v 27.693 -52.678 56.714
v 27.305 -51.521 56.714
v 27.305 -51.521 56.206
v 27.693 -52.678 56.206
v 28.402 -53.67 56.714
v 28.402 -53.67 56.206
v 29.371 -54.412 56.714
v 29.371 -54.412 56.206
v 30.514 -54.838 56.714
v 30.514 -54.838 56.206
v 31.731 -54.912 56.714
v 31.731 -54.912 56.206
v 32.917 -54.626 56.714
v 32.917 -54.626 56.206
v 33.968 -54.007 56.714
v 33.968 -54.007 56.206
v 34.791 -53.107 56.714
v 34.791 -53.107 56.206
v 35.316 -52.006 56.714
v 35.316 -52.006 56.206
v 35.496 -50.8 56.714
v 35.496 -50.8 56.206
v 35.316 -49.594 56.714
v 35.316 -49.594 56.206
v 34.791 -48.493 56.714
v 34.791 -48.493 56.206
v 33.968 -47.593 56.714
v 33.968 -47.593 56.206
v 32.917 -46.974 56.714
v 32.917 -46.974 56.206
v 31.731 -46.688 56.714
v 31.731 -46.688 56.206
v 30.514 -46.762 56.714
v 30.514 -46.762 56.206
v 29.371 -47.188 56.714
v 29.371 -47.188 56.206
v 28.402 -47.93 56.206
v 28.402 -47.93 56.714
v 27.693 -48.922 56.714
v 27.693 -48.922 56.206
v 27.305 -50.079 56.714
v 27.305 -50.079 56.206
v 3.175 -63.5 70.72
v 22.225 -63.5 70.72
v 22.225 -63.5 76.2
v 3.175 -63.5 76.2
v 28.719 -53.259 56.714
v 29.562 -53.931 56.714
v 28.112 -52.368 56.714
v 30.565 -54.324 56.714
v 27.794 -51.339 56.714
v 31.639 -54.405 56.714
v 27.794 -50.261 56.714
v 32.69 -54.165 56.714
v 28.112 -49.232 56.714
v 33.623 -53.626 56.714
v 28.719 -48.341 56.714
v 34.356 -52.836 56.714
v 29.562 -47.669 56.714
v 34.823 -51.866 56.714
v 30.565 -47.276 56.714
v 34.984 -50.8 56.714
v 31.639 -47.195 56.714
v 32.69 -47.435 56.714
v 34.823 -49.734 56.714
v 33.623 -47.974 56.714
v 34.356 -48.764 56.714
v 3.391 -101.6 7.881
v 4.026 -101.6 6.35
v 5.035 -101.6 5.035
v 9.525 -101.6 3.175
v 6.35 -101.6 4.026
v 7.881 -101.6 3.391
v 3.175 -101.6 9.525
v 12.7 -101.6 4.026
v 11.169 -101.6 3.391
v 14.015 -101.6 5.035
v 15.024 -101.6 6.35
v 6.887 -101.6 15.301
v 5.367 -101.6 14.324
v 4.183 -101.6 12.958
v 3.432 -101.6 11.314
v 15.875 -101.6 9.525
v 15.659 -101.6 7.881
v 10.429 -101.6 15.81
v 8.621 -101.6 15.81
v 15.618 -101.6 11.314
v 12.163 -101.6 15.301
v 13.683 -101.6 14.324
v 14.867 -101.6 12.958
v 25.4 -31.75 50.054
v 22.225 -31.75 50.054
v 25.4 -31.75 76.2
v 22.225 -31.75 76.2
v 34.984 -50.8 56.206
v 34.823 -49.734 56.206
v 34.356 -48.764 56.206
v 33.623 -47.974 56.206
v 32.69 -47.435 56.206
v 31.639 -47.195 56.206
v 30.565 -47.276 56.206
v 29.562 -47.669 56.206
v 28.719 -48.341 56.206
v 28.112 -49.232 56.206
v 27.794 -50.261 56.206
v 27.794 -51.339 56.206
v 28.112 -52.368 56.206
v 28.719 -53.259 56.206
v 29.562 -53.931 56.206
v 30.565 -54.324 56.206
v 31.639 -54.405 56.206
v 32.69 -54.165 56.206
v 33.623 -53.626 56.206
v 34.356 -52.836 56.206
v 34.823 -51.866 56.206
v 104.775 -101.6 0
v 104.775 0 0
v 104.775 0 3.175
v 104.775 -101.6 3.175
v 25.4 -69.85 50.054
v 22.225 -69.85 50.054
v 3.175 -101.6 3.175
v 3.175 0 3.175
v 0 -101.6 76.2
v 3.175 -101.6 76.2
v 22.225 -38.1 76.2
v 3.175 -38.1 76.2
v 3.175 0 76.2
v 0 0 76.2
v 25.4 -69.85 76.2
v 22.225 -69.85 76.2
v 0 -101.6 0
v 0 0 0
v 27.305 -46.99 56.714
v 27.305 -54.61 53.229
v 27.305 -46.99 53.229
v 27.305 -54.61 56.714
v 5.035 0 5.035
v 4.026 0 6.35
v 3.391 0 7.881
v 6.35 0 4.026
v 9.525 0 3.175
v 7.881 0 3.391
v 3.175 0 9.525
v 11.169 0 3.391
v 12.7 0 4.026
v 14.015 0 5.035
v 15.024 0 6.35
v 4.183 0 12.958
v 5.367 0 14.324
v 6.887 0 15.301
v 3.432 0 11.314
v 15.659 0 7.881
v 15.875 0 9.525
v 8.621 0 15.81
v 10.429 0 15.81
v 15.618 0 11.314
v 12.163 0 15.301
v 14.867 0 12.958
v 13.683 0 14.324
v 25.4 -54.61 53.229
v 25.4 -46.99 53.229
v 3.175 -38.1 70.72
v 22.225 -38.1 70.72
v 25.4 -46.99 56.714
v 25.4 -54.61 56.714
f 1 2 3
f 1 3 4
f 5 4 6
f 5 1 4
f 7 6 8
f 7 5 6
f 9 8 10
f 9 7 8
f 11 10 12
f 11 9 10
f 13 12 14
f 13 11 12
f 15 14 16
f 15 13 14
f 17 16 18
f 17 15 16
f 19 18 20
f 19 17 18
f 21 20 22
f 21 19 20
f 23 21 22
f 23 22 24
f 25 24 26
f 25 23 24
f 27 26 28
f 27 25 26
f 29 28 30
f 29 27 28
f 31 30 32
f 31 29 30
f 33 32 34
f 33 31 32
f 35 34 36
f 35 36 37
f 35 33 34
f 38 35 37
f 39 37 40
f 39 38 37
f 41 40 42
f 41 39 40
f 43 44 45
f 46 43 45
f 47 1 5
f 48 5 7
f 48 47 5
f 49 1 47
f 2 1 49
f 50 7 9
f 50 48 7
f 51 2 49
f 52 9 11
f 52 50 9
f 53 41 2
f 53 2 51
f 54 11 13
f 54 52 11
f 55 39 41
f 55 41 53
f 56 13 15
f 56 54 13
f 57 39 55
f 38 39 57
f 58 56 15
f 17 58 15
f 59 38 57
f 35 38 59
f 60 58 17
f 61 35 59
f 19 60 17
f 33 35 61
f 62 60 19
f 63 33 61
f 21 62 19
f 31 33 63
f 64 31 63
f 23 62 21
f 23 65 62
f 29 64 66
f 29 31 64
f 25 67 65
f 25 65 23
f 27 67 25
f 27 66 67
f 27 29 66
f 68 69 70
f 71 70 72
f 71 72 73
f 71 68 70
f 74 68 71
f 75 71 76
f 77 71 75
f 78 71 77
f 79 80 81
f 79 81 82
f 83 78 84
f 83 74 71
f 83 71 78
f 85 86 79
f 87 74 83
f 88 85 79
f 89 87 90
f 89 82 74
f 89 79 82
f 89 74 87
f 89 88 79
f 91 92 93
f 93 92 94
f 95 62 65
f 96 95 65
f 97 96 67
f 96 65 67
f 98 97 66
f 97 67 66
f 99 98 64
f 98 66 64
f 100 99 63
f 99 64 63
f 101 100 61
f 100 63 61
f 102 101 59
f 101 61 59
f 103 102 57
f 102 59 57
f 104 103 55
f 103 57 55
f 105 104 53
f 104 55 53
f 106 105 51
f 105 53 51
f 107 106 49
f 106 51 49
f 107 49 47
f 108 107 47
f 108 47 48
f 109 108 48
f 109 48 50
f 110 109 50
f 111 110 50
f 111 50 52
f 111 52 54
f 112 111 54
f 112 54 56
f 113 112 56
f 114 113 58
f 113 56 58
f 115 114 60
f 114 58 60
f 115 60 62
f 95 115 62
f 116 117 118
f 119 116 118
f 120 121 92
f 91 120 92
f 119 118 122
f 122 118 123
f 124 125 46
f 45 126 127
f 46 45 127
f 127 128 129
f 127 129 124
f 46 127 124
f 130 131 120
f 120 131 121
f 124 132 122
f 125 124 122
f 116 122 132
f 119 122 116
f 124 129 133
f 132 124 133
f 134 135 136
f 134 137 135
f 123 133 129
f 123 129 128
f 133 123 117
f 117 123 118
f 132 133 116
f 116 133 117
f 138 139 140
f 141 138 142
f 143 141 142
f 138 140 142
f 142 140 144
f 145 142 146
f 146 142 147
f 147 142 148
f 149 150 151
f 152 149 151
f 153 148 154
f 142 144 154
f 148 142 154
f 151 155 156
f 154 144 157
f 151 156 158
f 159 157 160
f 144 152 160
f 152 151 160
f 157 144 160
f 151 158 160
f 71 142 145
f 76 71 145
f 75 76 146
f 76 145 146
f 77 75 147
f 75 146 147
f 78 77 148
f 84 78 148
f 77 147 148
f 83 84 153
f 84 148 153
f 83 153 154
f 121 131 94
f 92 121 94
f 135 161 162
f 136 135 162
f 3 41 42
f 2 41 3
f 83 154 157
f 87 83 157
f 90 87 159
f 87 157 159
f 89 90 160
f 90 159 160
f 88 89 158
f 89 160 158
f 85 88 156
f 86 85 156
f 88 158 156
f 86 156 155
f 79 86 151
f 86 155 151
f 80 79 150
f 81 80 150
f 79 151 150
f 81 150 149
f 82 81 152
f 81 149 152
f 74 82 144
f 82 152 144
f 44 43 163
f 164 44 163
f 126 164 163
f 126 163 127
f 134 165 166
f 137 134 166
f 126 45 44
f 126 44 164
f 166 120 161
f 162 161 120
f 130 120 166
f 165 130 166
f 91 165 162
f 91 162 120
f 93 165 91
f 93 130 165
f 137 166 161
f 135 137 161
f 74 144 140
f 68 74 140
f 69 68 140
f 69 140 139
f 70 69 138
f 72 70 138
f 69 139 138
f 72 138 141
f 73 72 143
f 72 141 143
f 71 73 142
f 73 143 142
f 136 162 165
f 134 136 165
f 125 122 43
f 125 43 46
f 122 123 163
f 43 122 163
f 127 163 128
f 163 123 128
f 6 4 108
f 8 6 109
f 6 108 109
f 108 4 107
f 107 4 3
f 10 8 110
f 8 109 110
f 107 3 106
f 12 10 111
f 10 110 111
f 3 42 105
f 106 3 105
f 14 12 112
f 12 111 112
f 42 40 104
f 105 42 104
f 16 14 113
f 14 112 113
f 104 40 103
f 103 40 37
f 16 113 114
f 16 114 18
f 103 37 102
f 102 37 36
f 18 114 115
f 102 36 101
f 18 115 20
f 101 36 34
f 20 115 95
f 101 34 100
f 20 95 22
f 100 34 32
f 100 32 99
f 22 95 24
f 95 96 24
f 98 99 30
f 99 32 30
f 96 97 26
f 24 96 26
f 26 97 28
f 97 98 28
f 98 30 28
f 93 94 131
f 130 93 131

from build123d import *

# Parameters (mm, degrees)
F1_DEPTH  = 101.6
F2_W      = 25.4
F2_H      = 5.4802587152
F3_DEPTH  = 19.05
F4_W      = 25.4
F4_H      = 5.4802587152
F5_DEPTH  = 3.175
F7_DEPTH  = 1.905
F9_DEPTH  = 0.508
F10_R     = 3.6149372384
F11_DEPTH = 0.508


with BuildPart() as f1:
    # F0 (on Front) → F1 (new body)
    with BuildSketch(Plane.XZ):
        Polygon((0, 76.2), (0, 0), (104.775, 0), (104.775, 3.175), (9.5249999312, 3.175), (3.175, 3.175), (3.175, 9.525), (3.175, 76.2), align=None)
    extrude(amount=F1_DEPTH)

    # F2 (on face) → F3 (join)
    with BuildSketch(Plane.YZ.offset(3.175)):
        with Locations((-50.8, 73.4598706424)):
            Rectangle(F2_W, F2_H)
    extrude(amount=F3_DEPTH)


with BuildPart() as f1b:
    # F0 (on Front) → F1, piece 2 (new body)
    with BuildSketch(Plane.XZ):
        with BuildLine():
            ThreePointArc((3.175, 9.525), (5.0348719151, 5.0348719638), (9.5249999312, 3.175))
            ThreePointArc((9.5249999312, 3.175), (14.0151280362, 5.0348719151), (15.875, 9.525))
            ThreePointArc((15.875, 9.525), (9.525, 15.875), (3.175, 9.525))
        make_face()
    extrude(amount=F1_DEPTH)


with BuildPart() as f5:
    # F4 (on face) → F5 (new body)
    with BuildSketch(Plane.YZ.offset(22.225)):
        Polygon((-31.75, 76.2), (-38.1, 76.2), (-38.1, 70.7197412848), (-63.5, 70.7197412848), (-63.5, 76.2), (-69.85, 76.2), (-69.85, 50.0536486506), (-31.75, 50.0536486506), align=None)
        with Locations((-50.8, 73.4598706424)):
            Rectangle(F4_W, F4_H)
    extrude(amount=F5_DEPTH)

    # F6 (on face) → F7 (join)
    with BuildSketch(Plane.YZ.offset(25.4)):
        Polygon((-54.61, 53.2286486506), (-50.8, 53.2286486506), (-46.99, 53.2286486506), (-46.99, 56.7143506289), (-54.61, 56.7143506289), align=None)
    extrude(amount=F7_DEPTH)


with BuildPart() as f9:
    # F8 (on face) → F9 (new body)
    with BuildSketch(Plane.XY.offset(56.7143506289)):
        with BuildLine():
            ThreePointArc((27.305, -51.5212213599), (31.7310056975, -54.9115943532), (35.4965, -50.8))
            ThreePointArc((35.4965, -50.8), (31.7310056975, -46.6884056468), (27.305, -50.0787786401))
            Line((27.305, -50.0787786401), (27.305, -51.5212213599))
        make_face()
    extrude(amount=-F9_DEPTH)

    # F10 (on face) → F11 (cut)
    with BuildSketch(Plane.XY.offset(56.7143506289)):
        with Locations((31.369, -50.8)):
            Circle(F10_R)
    extrude(amount=-F11_DEPTH, mode=Mode.SUBTRACT)


solid = Compound([f1.part, f1b.part, f5.part, f9.part])
